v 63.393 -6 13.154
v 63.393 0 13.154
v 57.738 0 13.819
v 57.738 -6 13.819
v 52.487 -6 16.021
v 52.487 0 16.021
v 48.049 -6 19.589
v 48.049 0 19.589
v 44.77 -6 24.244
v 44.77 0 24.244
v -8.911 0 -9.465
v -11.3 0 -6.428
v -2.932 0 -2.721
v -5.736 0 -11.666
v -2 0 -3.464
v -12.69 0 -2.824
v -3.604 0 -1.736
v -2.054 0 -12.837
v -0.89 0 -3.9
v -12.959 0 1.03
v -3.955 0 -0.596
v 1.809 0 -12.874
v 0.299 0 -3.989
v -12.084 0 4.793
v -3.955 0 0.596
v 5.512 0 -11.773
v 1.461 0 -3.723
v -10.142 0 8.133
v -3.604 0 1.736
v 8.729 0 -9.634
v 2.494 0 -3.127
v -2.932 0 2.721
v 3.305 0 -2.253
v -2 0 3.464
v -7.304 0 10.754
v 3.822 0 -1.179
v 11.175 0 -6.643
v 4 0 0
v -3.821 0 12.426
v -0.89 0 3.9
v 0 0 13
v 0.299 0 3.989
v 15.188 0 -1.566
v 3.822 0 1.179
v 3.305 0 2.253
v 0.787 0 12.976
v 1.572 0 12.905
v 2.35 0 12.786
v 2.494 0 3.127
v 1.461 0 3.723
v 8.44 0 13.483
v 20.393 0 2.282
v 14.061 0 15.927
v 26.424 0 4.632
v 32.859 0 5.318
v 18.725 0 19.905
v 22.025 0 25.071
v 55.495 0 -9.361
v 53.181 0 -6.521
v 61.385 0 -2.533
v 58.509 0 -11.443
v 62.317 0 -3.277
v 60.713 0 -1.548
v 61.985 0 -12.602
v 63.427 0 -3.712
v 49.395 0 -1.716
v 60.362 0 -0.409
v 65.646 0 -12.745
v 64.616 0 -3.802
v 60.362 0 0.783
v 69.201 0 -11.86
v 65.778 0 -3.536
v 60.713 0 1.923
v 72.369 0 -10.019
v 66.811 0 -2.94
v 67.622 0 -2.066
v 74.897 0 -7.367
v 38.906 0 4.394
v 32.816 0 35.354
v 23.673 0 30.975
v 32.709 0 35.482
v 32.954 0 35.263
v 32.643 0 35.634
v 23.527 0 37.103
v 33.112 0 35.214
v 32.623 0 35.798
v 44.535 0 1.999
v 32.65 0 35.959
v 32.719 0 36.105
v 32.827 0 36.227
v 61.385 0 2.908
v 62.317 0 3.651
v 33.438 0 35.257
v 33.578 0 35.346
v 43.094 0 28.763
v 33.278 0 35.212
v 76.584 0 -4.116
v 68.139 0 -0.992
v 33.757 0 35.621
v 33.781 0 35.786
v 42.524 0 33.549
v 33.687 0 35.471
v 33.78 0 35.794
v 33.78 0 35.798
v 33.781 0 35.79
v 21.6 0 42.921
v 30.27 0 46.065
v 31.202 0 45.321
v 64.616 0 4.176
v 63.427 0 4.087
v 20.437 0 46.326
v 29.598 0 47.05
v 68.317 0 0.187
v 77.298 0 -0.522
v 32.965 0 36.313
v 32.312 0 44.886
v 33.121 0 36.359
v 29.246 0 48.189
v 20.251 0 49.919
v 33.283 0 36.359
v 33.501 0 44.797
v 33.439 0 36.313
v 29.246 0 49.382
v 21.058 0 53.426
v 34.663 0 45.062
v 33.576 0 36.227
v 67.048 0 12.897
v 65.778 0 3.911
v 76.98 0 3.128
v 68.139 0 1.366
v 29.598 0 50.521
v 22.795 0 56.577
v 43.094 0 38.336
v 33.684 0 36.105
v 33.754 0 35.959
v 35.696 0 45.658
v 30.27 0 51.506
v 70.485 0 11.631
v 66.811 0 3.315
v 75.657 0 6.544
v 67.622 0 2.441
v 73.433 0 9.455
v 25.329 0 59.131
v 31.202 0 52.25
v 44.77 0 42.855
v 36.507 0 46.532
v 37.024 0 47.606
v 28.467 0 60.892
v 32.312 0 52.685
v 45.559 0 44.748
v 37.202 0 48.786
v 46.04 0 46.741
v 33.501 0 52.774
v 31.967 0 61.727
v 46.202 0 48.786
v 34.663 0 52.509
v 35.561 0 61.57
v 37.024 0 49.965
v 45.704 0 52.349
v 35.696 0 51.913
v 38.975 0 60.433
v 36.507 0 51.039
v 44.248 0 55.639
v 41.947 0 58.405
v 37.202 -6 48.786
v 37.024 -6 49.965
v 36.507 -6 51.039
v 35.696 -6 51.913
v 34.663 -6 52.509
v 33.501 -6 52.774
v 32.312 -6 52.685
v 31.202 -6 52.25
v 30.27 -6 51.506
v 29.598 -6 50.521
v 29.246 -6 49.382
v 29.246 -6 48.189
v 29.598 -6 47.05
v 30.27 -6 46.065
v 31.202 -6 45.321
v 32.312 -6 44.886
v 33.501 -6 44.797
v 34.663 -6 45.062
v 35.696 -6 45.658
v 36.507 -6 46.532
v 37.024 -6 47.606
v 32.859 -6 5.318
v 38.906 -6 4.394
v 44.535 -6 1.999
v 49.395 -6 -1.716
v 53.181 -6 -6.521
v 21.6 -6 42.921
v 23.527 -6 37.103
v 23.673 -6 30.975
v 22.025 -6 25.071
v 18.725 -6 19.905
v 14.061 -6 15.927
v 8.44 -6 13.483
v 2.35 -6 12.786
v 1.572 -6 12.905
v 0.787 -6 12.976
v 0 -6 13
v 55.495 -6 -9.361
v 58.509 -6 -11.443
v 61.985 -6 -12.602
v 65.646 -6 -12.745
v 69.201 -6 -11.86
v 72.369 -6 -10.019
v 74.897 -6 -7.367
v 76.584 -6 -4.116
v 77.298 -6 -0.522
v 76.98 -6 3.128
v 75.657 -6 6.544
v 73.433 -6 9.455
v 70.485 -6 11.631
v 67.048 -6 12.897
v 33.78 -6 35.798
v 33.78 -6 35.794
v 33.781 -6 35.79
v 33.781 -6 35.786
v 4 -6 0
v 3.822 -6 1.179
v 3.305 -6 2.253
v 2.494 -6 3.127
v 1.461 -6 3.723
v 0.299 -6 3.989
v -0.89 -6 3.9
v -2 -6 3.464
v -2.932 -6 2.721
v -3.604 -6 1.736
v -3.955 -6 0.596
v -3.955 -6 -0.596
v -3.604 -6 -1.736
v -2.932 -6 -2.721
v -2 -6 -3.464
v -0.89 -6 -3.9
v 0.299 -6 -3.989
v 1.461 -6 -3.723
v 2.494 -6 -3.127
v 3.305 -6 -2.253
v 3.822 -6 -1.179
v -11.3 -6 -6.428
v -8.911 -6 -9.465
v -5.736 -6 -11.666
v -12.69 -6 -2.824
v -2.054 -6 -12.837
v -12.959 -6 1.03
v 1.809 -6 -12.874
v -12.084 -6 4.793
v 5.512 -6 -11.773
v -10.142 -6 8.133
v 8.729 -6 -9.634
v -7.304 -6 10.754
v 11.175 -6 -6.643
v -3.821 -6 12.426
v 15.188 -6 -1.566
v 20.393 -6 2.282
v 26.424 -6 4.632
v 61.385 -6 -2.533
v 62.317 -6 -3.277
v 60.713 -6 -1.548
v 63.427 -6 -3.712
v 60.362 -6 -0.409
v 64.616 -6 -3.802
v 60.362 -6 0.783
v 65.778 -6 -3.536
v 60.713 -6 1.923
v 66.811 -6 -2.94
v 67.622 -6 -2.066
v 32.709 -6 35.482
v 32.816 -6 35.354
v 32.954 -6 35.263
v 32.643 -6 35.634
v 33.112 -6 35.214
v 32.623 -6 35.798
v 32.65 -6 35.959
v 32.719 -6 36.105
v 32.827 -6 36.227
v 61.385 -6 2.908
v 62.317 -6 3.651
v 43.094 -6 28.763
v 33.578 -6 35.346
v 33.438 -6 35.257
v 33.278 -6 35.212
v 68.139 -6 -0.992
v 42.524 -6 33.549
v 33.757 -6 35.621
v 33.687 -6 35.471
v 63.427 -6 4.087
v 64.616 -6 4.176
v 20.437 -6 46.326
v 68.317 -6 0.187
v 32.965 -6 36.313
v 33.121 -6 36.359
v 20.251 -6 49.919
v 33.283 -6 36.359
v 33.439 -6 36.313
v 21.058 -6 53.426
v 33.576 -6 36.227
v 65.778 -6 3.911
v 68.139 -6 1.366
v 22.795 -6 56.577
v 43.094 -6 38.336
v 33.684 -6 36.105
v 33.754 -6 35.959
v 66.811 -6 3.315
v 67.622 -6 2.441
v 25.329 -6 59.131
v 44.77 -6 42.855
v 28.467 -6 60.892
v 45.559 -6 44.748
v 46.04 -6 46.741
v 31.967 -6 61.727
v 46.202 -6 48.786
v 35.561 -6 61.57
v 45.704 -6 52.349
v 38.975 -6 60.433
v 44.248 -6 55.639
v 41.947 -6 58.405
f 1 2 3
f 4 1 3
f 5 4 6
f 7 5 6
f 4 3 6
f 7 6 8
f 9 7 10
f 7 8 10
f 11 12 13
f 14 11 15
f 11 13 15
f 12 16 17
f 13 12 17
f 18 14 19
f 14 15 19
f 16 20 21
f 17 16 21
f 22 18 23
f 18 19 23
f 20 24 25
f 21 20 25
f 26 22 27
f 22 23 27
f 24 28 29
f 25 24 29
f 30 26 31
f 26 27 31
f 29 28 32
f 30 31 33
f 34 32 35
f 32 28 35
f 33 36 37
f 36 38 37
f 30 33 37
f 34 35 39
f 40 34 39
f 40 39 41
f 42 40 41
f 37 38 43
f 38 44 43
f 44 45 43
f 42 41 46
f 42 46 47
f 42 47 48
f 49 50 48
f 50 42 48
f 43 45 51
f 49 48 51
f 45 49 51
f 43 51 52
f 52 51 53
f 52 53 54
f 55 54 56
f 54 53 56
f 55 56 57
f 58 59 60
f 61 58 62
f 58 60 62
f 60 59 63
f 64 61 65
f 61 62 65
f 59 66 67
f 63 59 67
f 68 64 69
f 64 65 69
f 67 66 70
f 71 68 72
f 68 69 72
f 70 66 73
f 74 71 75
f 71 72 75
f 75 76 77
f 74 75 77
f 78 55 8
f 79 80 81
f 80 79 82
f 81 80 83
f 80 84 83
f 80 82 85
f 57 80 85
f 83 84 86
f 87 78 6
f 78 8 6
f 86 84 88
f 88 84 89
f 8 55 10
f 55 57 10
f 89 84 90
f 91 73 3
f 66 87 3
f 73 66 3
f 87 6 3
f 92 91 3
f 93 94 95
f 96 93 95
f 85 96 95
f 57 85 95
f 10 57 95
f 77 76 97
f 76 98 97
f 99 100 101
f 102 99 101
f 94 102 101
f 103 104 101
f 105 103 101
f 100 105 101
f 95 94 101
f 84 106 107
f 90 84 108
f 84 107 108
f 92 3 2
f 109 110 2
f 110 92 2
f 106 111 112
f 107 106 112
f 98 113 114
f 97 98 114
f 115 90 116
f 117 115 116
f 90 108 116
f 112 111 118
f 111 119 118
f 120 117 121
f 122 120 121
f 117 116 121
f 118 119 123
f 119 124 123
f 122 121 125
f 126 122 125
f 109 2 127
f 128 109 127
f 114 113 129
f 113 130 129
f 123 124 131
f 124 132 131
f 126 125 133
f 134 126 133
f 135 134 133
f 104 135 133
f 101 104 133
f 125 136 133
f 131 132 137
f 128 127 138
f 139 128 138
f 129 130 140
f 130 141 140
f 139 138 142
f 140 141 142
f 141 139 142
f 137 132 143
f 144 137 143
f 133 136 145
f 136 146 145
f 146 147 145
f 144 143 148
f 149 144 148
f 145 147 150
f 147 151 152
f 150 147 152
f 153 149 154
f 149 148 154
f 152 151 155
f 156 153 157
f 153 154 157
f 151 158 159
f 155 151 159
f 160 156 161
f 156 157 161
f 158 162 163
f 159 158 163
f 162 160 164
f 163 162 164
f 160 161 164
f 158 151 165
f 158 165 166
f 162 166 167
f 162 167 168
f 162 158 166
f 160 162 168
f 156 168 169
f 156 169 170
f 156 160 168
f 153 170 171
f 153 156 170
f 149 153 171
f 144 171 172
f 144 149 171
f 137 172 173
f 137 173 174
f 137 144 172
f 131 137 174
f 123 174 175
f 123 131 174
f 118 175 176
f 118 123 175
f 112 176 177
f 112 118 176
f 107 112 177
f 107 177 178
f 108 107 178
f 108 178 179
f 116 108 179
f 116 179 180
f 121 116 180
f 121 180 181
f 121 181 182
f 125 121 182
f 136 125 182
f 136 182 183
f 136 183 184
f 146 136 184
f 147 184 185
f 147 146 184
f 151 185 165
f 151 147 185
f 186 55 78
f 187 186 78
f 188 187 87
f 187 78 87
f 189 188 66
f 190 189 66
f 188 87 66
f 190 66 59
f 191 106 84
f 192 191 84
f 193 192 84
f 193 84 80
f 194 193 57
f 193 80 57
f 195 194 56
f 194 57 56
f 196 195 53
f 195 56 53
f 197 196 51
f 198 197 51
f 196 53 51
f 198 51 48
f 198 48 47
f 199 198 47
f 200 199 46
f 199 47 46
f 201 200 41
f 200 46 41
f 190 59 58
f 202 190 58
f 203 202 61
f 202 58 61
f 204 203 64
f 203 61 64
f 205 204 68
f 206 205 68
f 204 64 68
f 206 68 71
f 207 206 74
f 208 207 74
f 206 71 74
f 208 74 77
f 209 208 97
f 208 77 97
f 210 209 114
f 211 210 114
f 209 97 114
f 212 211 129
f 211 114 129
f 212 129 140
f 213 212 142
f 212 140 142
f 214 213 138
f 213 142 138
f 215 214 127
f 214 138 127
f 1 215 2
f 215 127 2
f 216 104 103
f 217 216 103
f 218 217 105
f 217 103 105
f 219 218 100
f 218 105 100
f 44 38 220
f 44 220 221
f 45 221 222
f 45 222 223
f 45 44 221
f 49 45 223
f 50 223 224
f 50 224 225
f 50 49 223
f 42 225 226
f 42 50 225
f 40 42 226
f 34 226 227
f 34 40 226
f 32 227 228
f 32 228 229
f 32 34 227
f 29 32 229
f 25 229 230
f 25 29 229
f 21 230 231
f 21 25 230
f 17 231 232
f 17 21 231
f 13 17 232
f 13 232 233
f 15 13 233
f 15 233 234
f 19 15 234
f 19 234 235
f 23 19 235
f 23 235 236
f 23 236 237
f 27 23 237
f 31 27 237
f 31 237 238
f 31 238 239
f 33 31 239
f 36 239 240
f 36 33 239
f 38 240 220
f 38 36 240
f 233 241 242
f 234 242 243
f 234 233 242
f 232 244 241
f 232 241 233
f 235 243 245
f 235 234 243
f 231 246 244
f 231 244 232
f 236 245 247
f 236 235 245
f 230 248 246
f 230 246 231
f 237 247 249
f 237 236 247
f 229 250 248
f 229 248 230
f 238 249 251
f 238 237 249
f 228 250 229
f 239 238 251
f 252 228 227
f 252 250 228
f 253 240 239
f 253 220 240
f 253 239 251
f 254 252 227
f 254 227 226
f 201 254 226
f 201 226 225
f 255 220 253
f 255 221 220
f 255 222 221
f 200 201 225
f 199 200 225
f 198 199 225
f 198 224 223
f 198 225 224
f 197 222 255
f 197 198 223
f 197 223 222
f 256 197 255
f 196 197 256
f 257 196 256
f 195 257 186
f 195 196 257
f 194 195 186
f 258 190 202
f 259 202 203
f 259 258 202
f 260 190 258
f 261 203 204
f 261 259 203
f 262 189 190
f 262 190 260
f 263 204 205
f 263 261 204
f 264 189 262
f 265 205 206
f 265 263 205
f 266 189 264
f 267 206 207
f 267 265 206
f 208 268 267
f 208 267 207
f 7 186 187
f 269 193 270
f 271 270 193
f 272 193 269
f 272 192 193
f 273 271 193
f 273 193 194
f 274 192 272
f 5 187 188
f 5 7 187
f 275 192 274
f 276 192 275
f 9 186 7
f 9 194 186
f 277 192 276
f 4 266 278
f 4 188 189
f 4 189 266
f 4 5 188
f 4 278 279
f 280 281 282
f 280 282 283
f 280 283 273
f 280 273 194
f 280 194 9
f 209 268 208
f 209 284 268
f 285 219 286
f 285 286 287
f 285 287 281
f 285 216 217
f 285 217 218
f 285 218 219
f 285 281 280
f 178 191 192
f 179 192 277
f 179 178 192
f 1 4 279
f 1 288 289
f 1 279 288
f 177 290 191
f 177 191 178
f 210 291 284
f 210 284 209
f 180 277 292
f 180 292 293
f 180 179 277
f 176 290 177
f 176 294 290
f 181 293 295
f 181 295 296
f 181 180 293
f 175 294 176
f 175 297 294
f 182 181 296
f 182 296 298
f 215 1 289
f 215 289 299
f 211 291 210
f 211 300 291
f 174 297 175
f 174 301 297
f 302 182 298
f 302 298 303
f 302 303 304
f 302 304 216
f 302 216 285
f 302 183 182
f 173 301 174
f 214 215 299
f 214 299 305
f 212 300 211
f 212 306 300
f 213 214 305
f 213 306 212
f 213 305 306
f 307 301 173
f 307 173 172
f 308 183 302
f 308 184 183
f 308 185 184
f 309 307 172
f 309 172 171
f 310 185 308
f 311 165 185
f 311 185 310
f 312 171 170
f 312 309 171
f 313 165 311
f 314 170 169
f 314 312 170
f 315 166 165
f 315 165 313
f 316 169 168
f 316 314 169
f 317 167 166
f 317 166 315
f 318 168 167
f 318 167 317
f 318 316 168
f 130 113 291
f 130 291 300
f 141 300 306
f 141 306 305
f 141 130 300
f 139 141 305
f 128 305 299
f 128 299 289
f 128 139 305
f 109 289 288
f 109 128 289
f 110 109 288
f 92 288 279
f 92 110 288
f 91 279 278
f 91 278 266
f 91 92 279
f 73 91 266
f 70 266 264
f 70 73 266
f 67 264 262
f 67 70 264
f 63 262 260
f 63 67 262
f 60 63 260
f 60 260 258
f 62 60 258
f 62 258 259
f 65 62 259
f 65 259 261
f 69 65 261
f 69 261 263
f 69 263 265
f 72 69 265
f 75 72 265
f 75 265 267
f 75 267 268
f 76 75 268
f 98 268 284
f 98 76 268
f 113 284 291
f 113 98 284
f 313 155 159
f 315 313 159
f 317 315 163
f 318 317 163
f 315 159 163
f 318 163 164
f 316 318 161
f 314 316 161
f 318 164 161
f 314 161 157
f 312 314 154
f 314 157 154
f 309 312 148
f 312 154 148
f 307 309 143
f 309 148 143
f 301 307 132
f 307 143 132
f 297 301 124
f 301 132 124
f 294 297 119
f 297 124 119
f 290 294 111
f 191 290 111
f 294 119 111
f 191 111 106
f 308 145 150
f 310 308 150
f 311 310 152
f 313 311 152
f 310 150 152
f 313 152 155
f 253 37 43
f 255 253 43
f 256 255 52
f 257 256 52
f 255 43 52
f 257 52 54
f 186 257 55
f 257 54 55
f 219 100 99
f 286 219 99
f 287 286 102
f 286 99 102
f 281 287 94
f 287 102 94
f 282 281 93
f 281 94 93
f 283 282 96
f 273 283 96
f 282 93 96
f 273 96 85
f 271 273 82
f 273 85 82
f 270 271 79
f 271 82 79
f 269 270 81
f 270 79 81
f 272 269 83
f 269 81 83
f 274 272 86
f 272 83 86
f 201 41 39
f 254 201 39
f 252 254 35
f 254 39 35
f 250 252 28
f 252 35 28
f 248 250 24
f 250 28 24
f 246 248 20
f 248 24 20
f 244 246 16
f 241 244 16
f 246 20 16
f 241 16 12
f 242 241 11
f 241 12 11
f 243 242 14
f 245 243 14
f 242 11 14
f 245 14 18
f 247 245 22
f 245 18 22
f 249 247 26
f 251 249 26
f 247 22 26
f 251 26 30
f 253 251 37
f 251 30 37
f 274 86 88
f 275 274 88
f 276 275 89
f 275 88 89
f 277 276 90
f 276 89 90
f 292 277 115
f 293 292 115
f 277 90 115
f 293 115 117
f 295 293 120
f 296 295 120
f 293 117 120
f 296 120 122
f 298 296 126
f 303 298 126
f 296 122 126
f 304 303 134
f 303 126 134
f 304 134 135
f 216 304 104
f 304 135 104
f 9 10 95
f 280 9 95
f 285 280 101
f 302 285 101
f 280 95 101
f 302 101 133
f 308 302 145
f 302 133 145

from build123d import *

# Parameters (mm, degrees)
F0_R     = 9.5
F0_R_2   = 4
F1_DEPTH = 6


with BuildPart() as f1:
    # F0 (on Front) → F1 (new body)
    with BuildSketch(Plane.XZ):
        with BuildLine():
            ThreePointArc((2.350153171, 12.7858038493), (1.1720328397, 12.8595060447), (0, 13))
            ThreePointArc((0, 13), (-11.2995091051, -6.4281485658), (11.1746035767, -6.6429086178))
            ThreePointArc((11.1746035767, -6.6429086178), (12.5353469536, -3.4445720709), (13, 0))
            ThreePointArc((13, 0), (9.9887935013, 8.320096417), (2.350153171, 12.7858038493))
        make_face()
        Circle(F0_R, mode=Mode.SUBTRACT)
        with BuildLine():
            ThreePointArc((2.350153171, 12.7858038493), (1.179947024, 12.9463402172), (0, 13))
            ThreePointArc((0, 13), (1.1720328397, 12.8595060447), (2.350153171, 12.7858038493))
        make_face()
        with BuildLine():
            ThreePointArc((13, 0), (12.5353469536, -3.4445720709), (11.1746035767, -6.6429086178))
            ThreePointArc((11.1746035767, -6.6429086178), (20.3927051131, 2.2823011589), (32.8593572911, 5.3179804839))
            ThreePointArc((32.8593572911, 5.3179804839), (22.0397803989, 11.649441895), (21.5996059124, 24.1776857522))
            ThreePointArc((21.5996059124, 24.1776857522), (13.63881463, 15.6701075209), (2.350153171, 12.7858038493))
            ThreePointArc((2.350153171, 12.7858038493), (9.9887935013, 8.320096417), (13, 0))
        make_face()
        with BuildLine():
            ThreePointArc((21.5996059124, 24.1776857522), (22.0397803989, 11.649441895), (32.8593572911, 5.3179804839))
            ThreePointArc((32.8593572911, 5.3179804839), (42.272310005, 9.0007955279), (46.2018025219, 18.3134693652))
            ThreePointArc((46.2018025219, 18.3134693652), (45.8389012751, 21.3636718342), (44.7704586601, 24.243578568))
            ThreePointArc((44.7704586601, 24.243578568), (33.1648335269, 31.3134167995), (21.5996059124, 24.1776857522))
        make_face()
        with BuildLine():
            ThreePointArc((46.2018025219, 18.3134693652), (42.272310005, 9.0007955279), (32.8593572911, 5.3179804839))
            ThreePointArc((32.8593572911, 5.3179804839), (44.5354086005, 1.9994233392), (53.1813680275, -6.5205755628))
            ThreePointArc((53.1813680275, -6.5205755628), (52.7786540902, 6.1760009355), (63.3931152108, 13.154428295))
            ThreePointArc((63.3931152108, 13.154428295), (52.487300782, 16.0212898755), (44.7704586601, 24.243578568))
            ThreePointArc((44.7704586601, 24.243578568), (45.8389012751, 21.3636718342), (46.2018025219, 18.3134693652))
        make_face()
        with BuildLine():
            ThreePointArc((21.5996059834, 42.9212888668), (23.8334826654, 33.549487301), (21.5996059124, 24.1776857522))
            ThreePointArc((21.5996059124, 24.1776857522), (33.1648335269, 31.3134167995), (44.7704586601, 24.243578568))
            ThreePointArc((44.7704586601, 24.243578568), (42.5243018444, 33.5494874141), (44.7704586914, 42.8553962526))
            ThreePointArc((44.7704586914, 42.8553962526), (40.2259887899, 37.846547159), (33.7803843902, 35.7983870449))
            ThreePointArc((33.7803843902, 35.7983870449), (33.7804919256, 35.7919466185), (33.7805277722, 35.7855053943))
            ThreePointArc((33.7805277722, 35.7855053943), (33.1953612977, 35.2068159906), (32.6232206536, 35.7983870449))
            ThreePointArc((32.6232206536, 35.7983870449), (26.1465368827, 37.8665664916), (21.5996059834, 42.9212888668))
        make_face()
        with BuildLine():
            ThreePointArc((63.3931152108, 13.154428295), (52.7786540902, 6.1760009355), (53.1813680275, -6.5205755628))
            ThreePointArc((53.1813680275, -6.5205755628), (67.7981541622, -12.3379567831), (77.3170911302, 0.1873056959))
            ThreePointArc((77.3170911302, 0.1873056959), (73.176783931, 9.7007616124), (63.3931152108, 13.154428295))
        make_face()
        with Locations((64.3170911302, 0.1873056959)):
            Circle(F0_R, mode=Mode.SUBTRACT)
        with BuildLine():
            ThreePointArc((46.2018025219, 48.7855053943), (30.1875492977, 61.4312271017), (21.5996059834, 42.9212888668))
            ThreePointArc((21.5996059834, 42.9212888668), (26.1465368827, 37.8665664916), (32.6232206536, 35.7983870449))
            ThreePointArc((32.6232206536, 35.7983870449), (33.2018025219, 36.3642306445), (33.7803843902, 35.7983870449))
            ThreePointArc((33.7803843902, 35.7983870449), (40.2259887899, 37.846547159), (44.7704586914, 42.8553962526))
            ThreePointArc((44.7704586914, 42.8553962526), (45.8389012832, 45.7353029587), (46.2018025219, 48.7855053943))
        make_face()
        with Locations((33.2018025219, 48.7855053943)):
            Circle(F0_R, mode=Mode.SUBTRACT)
        with Locations((33.2018025219, 48.7855053943)):
            Circle(F0_R)
        with Locations((33.2018025219, 48.7855053943)):
            Circle(F0_R_2, mode=Mode.SUBTRACT)
        Circle(F0_R)
        Circle(F0_R_2, mode=Mode.SUBTRACT)
        with Locations((64.3170911302, 0.1873056959)):
            Circle(F0_R)
        with Locations((64.3170911302, 0.1873056959)):
            Circle(F0_R_2, mode=Mode.SUBTRACT)
    extrude(amount=F1_DEPTH)


solid = f1.part
